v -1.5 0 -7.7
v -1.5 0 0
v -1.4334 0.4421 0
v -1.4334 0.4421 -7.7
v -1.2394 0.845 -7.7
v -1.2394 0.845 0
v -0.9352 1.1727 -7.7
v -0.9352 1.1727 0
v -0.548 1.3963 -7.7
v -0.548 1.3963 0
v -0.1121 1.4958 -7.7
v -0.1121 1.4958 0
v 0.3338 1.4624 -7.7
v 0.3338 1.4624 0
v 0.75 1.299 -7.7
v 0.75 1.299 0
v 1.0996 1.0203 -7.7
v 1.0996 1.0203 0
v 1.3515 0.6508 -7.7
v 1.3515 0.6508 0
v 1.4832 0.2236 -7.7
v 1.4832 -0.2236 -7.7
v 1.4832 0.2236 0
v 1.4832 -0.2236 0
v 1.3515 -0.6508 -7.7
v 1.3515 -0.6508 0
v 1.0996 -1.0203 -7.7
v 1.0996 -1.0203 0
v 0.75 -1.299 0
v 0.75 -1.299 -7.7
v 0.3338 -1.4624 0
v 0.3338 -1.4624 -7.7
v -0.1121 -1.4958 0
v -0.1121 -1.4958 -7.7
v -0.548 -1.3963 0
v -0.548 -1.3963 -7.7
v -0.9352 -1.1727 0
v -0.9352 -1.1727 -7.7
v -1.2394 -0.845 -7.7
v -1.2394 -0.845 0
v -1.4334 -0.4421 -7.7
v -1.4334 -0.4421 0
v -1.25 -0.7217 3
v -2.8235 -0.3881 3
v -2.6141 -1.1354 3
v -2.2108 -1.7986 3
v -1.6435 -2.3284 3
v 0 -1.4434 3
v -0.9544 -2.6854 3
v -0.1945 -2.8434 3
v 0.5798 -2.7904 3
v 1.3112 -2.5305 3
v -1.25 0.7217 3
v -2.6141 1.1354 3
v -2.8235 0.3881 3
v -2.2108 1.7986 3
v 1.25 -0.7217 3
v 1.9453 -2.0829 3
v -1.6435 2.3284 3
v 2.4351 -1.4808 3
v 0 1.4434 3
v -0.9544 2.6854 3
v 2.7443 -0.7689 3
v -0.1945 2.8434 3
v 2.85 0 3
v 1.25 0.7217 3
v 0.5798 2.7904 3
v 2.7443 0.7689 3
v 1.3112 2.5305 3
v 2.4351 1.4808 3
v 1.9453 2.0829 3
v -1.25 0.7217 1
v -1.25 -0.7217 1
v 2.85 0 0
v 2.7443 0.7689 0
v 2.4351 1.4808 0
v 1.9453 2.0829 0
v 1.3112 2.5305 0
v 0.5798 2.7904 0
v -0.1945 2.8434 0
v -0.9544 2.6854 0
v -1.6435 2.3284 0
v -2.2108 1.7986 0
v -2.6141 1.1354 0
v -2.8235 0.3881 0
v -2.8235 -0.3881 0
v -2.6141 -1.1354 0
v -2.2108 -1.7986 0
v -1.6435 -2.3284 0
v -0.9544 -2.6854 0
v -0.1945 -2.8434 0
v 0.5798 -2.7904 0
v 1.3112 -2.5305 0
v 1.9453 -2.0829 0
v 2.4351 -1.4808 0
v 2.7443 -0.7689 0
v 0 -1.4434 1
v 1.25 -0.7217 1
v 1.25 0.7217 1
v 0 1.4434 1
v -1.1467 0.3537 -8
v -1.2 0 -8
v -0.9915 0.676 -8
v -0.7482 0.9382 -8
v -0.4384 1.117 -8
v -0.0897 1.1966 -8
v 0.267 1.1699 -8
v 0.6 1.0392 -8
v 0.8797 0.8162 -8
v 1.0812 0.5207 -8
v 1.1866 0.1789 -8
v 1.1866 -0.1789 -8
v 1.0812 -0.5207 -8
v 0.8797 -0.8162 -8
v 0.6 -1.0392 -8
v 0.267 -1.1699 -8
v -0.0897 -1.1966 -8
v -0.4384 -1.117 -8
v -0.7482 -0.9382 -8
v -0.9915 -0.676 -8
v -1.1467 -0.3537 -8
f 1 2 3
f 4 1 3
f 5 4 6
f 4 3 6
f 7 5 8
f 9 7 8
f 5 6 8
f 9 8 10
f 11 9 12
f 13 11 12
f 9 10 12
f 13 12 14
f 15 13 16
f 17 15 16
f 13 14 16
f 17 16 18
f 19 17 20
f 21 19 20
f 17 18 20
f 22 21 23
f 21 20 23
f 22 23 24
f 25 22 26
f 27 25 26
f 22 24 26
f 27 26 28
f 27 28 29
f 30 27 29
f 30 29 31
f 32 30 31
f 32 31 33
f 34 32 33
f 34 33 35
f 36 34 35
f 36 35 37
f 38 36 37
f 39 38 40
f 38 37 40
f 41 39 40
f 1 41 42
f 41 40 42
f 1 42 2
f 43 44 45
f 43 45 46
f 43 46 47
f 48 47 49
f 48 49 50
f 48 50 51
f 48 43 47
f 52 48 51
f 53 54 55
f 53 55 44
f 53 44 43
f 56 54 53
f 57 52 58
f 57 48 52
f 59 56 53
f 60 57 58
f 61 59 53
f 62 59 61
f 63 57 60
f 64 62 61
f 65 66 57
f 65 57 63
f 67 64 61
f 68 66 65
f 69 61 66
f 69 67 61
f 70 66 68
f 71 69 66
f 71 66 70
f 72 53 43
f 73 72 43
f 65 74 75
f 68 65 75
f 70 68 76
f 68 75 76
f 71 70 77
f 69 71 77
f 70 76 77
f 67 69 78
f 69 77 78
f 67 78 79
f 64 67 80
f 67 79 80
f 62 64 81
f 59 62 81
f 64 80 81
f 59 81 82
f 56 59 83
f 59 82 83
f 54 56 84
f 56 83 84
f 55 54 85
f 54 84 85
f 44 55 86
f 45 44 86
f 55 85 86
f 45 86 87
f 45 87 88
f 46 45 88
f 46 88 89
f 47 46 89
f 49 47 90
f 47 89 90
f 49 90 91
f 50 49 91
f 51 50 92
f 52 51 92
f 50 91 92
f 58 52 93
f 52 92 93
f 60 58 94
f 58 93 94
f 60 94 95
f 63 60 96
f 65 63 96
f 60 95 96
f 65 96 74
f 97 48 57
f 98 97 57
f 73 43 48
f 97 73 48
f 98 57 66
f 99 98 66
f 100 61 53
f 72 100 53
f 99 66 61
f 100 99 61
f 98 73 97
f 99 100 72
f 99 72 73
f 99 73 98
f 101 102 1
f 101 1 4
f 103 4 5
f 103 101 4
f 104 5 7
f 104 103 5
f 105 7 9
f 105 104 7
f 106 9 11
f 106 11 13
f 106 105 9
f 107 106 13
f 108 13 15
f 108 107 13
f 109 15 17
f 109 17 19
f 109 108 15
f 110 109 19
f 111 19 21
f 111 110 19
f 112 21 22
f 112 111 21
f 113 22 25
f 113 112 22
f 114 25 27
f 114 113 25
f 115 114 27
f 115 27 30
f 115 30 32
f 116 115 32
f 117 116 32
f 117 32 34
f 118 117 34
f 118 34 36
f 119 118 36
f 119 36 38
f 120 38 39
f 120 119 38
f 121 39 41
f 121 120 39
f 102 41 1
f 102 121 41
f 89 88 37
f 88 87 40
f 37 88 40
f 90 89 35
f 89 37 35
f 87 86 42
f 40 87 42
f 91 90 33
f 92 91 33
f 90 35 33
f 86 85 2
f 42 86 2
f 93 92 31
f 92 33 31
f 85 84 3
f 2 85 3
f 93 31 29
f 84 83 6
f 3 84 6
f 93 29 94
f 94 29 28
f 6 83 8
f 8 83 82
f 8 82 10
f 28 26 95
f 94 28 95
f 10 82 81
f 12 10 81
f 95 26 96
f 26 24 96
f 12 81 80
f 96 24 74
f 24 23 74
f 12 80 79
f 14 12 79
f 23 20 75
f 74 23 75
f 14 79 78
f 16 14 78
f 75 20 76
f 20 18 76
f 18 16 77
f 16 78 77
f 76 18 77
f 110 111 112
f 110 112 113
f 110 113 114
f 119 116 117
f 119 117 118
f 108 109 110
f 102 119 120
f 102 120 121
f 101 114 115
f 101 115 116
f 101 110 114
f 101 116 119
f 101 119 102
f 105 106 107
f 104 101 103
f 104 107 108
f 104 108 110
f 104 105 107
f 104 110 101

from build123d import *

# Parameters (mm, degrees)
SKETCH1_R           = 2.85
BOSS_EXTRUDE1_DEPTH = 3
SKETCH2_R           = 1.5
BOSS_EXTRUDE2_DEPTH = 8
CHAMFER1_SIZE       = 0.3
CUT_EXTRUDE1_DEPTH  = 2


with BuildPart() as part:
    # Sketch1 → Boss-Extrude1 (new body)
    with BuildSketch(Plane.XY):
        Circle(SKETCH1_R)
    extrude(amount=BOSS_EXTRUDE1_DEPTH)

    # Sketch2 → Boss-Extrude2 (add)
    with BuildSketch(Plane(origin=(0, 0, 0), x_dir=(-1, 0, 0), z_dir=(0, 0, -1))):
        Circle(SKETCH2_R)
    extrude(amount=BOSS_EXTRUDE2_DEPTH)

    # Chamfer1
    chamfer1_edges = [part.edges().sort_by_distance(p)[0] for p in [
        (1.5, 0, -8),
    ]]
    chamfer(chamfer1_edges, length=CHAMFER1_SIZE)

    # Sketch3 → Cut-Extrude1 (cut)
    with BuildSketch(Plane.XY.offset(3)):
        Polygon((0, 1.443375673), (-1.25, 0.721687836), (-1.25, -0.721687836), (0, -1.443375673), (1.25, -0.721687836), (1.25, 0.721687836), align=None)
    extrude(amount=-CUT_EXTRUDE1_DEPTH, mode=Mode.SUBTRACT)


solid = part.part
